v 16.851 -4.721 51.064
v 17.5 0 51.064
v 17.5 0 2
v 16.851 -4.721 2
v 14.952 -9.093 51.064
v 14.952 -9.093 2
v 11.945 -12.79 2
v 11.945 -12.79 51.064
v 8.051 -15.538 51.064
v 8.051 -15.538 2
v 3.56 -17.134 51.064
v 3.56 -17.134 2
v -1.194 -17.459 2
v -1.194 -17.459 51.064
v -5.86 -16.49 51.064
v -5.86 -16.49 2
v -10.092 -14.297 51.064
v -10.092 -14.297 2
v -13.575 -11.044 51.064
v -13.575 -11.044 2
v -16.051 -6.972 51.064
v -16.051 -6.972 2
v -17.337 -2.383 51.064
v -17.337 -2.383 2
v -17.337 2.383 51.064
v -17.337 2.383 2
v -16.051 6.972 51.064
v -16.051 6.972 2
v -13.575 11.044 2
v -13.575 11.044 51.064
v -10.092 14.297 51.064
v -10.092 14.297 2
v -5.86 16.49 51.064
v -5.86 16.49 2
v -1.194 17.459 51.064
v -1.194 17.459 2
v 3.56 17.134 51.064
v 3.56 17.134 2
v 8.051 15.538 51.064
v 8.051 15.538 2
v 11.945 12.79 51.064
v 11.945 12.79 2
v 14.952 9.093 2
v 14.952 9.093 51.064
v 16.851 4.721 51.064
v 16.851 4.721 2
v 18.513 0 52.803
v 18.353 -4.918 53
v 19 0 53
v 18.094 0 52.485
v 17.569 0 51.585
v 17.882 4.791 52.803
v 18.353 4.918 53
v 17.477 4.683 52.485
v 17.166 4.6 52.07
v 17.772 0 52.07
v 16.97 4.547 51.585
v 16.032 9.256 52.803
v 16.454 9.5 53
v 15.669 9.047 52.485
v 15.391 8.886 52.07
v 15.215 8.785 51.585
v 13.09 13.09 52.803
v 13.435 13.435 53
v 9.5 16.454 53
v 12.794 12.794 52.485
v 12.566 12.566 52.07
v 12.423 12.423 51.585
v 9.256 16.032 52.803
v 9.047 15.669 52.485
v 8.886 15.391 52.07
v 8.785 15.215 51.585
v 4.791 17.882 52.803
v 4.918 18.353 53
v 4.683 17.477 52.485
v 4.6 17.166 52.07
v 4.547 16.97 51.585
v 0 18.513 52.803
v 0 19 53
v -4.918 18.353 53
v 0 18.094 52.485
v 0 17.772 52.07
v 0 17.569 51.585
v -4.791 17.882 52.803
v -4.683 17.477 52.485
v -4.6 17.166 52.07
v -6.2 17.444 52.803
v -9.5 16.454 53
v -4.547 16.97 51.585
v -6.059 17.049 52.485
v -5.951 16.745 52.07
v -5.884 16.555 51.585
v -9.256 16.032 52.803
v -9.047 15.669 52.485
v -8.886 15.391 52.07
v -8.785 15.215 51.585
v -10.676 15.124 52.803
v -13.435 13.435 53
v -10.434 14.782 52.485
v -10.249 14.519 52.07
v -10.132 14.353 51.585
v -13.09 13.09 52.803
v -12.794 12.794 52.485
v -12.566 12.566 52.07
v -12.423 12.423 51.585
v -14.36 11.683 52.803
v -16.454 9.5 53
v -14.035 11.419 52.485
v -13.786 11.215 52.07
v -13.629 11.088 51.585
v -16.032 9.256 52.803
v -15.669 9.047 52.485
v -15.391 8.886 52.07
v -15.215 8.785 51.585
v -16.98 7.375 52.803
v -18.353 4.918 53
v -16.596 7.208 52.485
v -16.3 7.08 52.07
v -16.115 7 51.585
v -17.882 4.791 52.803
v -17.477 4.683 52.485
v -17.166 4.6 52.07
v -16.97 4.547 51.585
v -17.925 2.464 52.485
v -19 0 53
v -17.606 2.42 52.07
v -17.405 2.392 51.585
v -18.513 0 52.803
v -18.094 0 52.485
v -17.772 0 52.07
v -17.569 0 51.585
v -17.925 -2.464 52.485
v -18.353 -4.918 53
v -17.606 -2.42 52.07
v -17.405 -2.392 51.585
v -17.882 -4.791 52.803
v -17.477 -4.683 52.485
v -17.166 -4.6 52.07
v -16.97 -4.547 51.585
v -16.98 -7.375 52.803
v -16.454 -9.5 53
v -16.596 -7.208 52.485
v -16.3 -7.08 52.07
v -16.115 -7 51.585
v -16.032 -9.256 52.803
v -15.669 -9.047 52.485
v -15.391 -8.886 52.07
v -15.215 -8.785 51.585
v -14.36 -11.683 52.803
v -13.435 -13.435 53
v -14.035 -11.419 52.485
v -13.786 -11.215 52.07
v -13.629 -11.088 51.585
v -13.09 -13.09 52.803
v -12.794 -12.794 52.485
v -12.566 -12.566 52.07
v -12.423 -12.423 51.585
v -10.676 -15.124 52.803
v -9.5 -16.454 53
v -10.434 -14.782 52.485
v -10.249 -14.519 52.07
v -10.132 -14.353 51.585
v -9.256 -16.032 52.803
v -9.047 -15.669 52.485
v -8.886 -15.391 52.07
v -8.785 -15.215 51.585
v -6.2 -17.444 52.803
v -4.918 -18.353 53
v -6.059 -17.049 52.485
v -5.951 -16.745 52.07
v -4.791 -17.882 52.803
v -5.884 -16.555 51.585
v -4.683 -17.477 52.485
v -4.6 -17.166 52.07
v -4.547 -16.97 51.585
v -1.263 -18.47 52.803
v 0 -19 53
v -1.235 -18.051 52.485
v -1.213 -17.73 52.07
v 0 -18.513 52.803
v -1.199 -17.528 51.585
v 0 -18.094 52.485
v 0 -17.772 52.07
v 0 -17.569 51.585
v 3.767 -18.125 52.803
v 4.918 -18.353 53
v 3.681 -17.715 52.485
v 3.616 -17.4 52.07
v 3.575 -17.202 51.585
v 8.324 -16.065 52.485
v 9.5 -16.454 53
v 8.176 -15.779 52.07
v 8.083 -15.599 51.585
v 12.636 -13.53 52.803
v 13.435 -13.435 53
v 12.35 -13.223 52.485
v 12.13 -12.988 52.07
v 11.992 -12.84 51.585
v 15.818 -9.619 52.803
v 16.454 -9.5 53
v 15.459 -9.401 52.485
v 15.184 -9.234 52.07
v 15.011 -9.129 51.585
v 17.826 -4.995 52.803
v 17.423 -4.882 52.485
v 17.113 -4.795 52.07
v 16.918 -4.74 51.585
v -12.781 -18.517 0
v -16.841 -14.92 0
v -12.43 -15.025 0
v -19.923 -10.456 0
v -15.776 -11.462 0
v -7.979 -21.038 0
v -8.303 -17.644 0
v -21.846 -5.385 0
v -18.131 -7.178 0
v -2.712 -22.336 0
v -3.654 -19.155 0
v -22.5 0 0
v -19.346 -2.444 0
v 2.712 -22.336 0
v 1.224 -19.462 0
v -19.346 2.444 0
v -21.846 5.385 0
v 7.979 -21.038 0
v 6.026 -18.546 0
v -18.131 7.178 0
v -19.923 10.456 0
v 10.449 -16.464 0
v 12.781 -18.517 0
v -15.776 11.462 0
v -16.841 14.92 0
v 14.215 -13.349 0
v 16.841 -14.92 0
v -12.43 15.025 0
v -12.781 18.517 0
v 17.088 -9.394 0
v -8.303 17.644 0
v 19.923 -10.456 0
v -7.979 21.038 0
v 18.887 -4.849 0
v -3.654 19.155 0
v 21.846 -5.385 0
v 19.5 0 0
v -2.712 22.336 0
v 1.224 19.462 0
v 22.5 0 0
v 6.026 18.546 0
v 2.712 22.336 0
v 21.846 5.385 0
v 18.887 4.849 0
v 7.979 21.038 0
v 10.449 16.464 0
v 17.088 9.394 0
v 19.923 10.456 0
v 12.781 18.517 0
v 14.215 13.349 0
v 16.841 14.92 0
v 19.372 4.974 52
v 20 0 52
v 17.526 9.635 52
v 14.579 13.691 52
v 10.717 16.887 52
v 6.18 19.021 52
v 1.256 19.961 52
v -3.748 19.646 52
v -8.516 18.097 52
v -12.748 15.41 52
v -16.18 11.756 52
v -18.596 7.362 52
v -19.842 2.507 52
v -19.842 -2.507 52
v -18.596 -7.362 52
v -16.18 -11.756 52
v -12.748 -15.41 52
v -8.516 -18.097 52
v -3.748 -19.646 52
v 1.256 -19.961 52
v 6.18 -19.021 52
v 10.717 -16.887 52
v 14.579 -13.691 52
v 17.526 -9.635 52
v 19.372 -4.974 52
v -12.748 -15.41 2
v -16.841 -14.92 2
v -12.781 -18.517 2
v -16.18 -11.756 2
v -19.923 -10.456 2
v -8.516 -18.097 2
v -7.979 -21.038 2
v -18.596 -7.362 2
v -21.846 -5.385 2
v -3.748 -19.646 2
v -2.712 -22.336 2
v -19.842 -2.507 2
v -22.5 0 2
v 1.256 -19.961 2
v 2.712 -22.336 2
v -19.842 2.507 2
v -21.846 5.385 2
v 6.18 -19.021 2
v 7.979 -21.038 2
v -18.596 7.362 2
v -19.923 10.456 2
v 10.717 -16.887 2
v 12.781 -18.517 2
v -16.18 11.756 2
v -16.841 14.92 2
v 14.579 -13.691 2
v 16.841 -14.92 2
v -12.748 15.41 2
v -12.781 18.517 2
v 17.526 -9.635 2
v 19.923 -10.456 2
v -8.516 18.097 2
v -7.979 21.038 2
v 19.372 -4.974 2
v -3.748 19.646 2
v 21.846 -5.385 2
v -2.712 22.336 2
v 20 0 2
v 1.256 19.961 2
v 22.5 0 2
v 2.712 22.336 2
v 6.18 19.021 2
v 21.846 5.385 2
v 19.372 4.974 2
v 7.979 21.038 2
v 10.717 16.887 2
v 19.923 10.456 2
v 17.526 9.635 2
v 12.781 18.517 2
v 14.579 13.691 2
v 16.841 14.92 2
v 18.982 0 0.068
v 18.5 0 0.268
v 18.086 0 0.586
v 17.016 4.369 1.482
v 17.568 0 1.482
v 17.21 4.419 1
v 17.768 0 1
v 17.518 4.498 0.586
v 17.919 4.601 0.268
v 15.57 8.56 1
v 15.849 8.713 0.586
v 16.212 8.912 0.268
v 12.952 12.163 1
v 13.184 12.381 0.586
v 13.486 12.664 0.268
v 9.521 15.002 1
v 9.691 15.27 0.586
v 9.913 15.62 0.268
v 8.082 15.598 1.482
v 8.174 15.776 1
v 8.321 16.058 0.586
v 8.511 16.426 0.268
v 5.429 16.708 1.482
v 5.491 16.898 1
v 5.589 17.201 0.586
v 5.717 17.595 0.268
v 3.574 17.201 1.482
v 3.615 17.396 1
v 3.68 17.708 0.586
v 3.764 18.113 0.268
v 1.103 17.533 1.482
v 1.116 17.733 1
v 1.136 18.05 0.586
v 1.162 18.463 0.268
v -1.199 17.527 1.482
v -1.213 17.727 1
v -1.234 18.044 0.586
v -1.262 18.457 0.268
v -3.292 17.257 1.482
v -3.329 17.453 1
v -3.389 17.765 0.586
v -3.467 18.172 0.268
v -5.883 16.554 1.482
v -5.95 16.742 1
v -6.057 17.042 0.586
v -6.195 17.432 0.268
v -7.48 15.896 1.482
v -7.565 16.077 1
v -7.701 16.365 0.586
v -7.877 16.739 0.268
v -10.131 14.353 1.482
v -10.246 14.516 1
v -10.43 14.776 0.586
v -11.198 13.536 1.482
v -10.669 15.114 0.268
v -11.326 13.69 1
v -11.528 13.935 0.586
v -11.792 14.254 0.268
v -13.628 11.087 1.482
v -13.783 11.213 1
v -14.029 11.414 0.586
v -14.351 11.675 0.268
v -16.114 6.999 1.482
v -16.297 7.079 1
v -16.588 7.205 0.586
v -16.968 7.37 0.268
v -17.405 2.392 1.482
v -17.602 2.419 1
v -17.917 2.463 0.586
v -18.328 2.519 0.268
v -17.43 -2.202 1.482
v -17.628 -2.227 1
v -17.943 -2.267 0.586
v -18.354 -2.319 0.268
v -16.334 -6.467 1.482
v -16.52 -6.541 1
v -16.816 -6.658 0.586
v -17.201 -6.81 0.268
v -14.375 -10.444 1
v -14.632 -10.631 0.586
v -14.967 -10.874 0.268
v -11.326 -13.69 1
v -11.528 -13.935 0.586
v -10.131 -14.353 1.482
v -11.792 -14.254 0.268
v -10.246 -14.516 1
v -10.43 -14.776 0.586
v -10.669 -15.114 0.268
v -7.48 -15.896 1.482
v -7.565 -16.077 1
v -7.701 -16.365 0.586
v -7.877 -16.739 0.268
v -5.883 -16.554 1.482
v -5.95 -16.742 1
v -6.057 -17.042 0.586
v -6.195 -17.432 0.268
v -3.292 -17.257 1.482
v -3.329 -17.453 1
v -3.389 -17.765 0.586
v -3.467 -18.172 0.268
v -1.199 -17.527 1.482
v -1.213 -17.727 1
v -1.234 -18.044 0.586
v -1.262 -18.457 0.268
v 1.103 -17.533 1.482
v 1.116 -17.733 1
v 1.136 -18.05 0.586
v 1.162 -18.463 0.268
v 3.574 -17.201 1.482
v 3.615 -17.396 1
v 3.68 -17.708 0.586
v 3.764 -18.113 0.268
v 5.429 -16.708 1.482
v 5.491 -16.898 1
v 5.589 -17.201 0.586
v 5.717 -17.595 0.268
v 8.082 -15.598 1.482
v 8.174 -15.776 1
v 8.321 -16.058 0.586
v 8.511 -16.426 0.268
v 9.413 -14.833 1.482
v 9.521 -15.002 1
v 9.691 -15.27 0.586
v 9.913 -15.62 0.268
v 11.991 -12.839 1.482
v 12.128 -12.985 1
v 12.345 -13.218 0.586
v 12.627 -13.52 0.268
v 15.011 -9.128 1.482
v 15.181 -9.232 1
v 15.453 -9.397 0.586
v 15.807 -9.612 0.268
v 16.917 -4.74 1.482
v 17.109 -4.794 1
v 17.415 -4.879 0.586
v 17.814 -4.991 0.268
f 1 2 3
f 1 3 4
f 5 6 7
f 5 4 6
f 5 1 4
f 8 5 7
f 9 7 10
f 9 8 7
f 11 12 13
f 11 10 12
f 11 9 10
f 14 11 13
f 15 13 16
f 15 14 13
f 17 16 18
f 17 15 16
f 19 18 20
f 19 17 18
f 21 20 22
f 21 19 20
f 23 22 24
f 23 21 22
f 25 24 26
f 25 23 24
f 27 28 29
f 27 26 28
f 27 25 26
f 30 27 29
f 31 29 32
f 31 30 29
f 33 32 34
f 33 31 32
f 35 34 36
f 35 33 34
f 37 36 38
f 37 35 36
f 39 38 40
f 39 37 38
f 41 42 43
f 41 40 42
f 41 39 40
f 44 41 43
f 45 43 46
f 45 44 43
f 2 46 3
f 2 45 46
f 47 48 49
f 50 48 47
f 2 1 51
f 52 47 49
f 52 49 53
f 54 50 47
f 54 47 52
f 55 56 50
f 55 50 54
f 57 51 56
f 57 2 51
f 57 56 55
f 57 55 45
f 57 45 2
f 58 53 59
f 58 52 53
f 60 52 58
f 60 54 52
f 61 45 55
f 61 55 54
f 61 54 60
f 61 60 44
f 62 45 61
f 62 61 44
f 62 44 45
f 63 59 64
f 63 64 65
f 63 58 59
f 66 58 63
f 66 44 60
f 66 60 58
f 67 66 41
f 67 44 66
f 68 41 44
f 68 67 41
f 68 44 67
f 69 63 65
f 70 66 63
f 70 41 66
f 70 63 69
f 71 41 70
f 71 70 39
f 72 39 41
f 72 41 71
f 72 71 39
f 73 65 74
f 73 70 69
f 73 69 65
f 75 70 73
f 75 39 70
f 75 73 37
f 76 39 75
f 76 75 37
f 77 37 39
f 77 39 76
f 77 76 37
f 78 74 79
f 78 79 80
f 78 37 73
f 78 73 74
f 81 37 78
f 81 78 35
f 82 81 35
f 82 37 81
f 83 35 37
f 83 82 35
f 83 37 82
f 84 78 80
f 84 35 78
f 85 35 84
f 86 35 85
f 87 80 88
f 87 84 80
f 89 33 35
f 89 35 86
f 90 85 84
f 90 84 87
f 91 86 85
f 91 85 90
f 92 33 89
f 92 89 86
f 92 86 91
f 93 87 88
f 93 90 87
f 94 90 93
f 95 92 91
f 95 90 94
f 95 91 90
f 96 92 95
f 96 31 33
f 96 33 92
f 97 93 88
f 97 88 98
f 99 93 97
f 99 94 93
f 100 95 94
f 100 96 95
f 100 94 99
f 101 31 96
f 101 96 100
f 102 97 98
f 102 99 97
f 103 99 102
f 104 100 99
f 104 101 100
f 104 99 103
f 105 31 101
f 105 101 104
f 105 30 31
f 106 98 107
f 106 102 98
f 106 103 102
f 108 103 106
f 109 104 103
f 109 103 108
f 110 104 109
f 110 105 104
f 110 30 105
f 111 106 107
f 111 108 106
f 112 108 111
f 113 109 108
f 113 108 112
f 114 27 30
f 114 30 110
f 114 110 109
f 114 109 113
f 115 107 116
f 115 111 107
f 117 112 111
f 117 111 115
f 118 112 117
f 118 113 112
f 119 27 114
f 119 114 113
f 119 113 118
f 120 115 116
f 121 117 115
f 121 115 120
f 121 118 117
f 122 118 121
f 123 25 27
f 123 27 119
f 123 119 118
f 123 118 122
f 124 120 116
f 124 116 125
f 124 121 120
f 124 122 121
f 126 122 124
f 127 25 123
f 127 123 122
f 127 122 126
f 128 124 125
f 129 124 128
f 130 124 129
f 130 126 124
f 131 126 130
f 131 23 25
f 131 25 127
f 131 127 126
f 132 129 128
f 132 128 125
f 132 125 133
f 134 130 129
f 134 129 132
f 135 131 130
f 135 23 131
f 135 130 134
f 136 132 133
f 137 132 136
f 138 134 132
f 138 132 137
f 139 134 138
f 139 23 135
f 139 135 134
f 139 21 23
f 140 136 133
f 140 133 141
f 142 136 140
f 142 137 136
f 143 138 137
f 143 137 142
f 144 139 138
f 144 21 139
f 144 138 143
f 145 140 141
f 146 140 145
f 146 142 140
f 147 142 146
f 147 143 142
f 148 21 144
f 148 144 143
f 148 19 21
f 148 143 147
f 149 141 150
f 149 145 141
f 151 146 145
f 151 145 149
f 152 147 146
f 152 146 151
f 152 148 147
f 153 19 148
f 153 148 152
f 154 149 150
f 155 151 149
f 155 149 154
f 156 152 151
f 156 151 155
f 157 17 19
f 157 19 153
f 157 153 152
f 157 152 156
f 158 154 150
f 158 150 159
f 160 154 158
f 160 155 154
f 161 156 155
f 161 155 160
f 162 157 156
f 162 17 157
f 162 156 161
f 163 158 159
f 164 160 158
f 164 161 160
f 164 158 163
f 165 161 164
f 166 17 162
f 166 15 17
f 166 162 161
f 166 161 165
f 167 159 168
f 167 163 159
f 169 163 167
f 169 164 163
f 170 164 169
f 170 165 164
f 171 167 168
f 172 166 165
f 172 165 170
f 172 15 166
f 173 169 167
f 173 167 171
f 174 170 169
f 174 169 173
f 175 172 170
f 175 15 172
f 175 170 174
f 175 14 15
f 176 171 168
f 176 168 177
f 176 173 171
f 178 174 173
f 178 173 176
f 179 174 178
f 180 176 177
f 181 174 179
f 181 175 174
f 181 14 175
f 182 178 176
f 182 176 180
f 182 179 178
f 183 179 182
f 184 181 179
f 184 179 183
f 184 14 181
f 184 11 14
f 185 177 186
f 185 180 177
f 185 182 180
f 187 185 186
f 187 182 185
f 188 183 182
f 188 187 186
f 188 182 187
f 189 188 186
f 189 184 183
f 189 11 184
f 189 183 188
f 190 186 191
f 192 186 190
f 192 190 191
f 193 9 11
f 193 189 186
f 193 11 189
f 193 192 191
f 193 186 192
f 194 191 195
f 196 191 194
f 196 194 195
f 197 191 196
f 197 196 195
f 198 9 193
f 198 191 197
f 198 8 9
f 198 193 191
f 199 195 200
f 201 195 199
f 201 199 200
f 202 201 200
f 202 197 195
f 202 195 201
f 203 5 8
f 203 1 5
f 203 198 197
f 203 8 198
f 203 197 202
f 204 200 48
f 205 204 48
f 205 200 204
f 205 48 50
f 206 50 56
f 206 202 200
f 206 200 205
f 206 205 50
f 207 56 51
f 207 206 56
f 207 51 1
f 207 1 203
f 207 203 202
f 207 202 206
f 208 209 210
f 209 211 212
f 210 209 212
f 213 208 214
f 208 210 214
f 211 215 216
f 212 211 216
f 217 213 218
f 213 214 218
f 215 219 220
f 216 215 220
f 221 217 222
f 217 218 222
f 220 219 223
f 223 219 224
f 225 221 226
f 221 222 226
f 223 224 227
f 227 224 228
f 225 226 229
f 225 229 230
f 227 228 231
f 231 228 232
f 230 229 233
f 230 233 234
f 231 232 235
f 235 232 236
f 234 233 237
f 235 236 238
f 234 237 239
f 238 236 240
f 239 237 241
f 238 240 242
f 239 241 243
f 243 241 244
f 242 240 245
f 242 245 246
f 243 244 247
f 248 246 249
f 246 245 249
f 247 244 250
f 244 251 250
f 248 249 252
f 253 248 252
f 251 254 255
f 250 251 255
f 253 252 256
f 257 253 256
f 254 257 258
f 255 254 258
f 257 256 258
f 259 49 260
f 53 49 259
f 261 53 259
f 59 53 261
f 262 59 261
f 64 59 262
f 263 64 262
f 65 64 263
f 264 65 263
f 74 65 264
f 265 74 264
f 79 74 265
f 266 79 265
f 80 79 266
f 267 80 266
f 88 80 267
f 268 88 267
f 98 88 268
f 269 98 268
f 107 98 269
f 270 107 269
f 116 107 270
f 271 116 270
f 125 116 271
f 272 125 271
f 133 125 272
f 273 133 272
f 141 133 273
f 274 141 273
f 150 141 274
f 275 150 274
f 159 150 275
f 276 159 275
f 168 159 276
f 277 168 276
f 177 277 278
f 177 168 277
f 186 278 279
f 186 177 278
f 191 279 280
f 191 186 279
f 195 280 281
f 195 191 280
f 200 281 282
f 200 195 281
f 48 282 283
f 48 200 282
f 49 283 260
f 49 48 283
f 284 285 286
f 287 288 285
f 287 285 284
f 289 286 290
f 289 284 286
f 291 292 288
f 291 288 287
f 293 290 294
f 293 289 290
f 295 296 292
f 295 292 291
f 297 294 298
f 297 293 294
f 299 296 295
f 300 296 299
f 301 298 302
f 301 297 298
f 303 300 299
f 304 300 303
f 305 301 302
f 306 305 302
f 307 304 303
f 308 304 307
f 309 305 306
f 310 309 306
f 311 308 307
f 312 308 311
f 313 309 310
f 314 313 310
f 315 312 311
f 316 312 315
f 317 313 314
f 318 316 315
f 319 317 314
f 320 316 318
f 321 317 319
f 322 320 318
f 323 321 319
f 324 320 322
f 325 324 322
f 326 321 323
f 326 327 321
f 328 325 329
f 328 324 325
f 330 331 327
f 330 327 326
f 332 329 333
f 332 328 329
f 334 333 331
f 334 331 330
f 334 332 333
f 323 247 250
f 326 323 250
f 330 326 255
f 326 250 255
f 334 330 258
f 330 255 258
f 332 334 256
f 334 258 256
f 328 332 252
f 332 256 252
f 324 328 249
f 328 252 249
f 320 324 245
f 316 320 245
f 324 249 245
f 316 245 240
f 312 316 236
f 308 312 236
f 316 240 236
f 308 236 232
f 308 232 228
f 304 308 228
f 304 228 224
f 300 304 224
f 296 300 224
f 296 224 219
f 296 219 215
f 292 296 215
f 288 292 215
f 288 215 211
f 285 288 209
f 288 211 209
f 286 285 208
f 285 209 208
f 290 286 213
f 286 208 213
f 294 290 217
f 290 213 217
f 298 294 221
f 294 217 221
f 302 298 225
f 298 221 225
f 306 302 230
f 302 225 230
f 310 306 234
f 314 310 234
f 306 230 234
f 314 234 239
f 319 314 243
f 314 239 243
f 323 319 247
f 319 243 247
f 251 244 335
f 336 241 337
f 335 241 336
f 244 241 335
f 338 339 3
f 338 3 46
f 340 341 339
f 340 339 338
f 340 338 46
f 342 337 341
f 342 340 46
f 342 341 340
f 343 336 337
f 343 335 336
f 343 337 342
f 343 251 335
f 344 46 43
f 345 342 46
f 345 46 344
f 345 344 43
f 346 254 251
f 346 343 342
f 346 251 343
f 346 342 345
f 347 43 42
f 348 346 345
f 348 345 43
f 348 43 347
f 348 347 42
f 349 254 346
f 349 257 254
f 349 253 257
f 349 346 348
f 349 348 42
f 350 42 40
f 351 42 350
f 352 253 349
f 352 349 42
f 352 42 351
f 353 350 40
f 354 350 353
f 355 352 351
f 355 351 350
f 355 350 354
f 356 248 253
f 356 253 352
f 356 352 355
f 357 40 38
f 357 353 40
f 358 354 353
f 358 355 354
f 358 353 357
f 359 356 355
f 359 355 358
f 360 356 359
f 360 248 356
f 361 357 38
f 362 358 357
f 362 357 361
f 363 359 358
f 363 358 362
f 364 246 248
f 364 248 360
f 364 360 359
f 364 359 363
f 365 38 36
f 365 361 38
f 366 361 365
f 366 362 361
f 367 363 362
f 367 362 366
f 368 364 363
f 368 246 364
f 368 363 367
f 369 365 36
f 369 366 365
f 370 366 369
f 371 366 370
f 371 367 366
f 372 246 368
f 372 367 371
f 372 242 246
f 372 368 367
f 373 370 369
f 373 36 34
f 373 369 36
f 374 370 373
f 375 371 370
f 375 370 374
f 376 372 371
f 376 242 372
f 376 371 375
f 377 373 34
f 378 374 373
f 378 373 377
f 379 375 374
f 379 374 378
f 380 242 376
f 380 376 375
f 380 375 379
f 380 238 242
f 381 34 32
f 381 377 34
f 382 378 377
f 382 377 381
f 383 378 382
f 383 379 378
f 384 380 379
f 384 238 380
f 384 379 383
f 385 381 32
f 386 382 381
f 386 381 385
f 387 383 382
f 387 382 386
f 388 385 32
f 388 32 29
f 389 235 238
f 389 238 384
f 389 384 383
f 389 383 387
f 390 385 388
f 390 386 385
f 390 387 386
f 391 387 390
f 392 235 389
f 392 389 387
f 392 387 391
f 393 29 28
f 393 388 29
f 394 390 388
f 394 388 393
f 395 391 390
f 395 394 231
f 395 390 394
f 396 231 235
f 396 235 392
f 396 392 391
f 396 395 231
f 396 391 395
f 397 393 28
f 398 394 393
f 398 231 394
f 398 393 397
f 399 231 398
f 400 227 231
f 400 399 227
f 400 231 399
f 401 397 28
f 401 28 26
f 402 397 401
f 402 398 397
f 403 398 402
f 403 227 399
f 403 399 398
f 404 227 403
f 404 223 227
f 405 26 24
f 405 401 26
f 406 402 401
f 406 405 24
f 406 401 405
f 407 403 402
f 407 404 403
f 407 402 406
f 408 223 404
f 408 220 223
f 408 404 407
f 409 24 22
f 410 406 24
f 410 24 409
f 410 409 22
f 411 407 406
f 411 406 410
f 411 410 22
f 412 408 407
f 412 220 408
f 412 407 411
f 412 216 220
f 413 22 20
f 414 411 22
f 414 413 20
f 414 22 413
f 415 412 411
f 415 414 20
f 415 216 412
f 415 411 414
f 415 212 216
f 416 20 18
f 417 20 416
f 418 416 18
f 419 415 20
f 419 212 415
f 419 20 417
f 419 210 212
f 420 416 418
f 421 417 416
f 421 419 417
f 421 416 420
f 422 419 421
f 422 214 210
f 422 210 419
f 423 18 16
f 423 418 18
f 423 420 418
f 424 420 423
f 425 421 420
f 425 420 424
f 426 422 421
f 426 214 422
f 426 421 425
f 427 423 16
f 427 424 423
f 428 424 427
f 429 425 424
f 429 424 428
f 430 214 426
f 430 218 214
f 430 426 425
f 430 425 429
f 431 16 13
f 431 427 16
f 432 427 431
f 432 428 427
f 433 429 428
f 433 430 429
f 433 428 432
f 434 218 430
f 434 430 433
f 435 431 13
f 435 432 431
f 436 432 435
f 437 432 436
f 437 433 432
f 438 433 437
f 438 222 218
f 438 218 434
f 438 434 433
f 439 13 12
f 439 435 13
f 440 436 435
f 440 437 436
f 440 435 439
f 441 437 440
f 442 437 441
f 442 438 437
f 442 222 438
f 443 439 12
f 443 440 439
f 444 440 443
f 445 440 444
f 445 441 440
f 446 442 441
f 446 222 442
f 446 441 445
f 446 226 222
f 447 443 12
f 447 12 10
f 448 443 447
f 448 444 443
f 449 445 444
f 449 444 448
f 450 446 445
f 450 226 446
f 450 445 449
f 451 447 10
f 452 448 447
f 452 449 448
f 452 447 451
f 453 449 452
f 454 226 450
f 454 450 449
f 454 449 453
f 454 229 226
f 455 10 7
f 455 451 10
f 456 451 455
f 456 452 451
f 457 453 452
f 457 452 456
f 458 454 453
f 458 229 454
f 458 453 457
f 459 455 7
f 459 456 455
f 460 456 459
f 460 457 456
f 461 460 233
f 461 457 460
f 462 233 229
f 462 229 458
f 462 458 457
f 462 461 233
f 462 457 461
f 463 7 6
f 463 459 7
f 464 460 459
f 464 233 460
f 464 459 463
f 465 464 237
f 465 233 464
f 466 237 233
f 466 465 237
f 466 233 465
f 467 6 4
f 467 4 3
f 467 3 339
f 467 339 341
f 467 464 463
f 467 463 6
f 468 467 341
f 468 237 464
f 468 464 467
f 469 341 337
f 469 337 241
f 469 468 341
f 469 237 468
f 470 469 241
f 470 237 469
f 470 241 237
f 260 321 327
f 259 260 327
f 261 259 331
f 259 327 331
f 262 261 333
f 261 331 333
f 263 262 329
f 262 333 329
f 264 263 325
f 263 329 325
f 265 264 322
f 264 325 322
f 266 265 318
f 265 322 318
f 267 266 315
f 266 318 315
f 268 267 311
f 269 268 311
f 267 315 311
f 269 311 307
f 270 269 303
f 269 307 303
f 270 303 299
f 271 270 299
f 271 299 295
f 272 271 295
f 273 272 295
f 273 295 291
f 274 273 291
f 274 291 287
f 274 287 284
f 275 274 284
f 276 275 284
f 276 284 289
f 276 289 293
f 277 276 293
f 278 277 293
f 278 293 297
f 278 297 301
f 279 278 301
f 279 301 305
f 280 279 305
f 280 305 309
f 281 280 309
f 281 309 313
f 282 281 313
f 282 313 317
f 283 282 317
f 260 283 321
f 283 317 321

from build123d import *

# Parameters (mm, degrees)
F0_R     = 20
F1_DEPTH = 53
F0_R_2   = 22.5
F2_DEPTH = 2
F3_T     = -2.5
F4_DEPTH = 3
F5_SIZE  = 1
F7_R     = 2


# Not quite as in the source:
# - a fillet or chamfer that OpenCascade refuses, or shapes differently, is made with other operations: its cross-section is extruded or revolved along the edge and cut away or added


with BuildPart() as f1:
    # F0 (on Top) → F1 (new body)
    with BuildSketch(Plane.XY):
        Circle(F0_R)
    extrude(amount=F1_DEPTH)

    # F0 (on Top) → F2 (join)
    with BuildSketch(Plane.XY):
        Circle(F0_R_2)
        Circle(F0_R, mode=Mode.SUBTRACT)
    extrude(amount=F2_DEPTH)

    # F3
    f3_openings = [f1.faces().sort_by_distance(p)[0] for p in [
        (0, 0, 53),
    ]]
    offset(amount=F3_T, openings=f3_openings)

    # F4 (cut): a face of the model
    f4_faces = [f1.faces().sort_by_distance(p)[0] for p in [
        (0, 0, 2.5),
    ]]
    extrude(f4_faces, amount=-F4_DEPTH, mode=Mode.SUBTRACT)

    # F5
    f5_edges = [f1.edges().sort_by_distance(p)[0] for p in [
        (-20, 0, 53),
    ]]
    chamfer(f5_edges, length=F5_SIZE)

    # F6: fillet of radius 2 on 2 edges, made by hand

    # F6_s1 → F6_t2 (revolve, cut)
    with BuildSketch(Plane.XZ):
        with BuildLine():
            ThreePointArc((19, 53), (17.9188611699, 52.2882531983), (17.5, 51.0635083269))
            Line((17.5, 51.0635083269), (17.5, 53))
            Line((17.5, 53), (19, 53))
        make_face()
    revolve(axis=Axis((0, 0, 53), (0, 0, 1)), mode=Mode.SUBTRACT)

    # F7
    f7_edges = [f1.edges().sort_by_distance(p)[0] for p in [
        (-17.5, 0, 0),
    ]]
    fillet(f7_edges, radius=F7_R)


solid = f1.part
